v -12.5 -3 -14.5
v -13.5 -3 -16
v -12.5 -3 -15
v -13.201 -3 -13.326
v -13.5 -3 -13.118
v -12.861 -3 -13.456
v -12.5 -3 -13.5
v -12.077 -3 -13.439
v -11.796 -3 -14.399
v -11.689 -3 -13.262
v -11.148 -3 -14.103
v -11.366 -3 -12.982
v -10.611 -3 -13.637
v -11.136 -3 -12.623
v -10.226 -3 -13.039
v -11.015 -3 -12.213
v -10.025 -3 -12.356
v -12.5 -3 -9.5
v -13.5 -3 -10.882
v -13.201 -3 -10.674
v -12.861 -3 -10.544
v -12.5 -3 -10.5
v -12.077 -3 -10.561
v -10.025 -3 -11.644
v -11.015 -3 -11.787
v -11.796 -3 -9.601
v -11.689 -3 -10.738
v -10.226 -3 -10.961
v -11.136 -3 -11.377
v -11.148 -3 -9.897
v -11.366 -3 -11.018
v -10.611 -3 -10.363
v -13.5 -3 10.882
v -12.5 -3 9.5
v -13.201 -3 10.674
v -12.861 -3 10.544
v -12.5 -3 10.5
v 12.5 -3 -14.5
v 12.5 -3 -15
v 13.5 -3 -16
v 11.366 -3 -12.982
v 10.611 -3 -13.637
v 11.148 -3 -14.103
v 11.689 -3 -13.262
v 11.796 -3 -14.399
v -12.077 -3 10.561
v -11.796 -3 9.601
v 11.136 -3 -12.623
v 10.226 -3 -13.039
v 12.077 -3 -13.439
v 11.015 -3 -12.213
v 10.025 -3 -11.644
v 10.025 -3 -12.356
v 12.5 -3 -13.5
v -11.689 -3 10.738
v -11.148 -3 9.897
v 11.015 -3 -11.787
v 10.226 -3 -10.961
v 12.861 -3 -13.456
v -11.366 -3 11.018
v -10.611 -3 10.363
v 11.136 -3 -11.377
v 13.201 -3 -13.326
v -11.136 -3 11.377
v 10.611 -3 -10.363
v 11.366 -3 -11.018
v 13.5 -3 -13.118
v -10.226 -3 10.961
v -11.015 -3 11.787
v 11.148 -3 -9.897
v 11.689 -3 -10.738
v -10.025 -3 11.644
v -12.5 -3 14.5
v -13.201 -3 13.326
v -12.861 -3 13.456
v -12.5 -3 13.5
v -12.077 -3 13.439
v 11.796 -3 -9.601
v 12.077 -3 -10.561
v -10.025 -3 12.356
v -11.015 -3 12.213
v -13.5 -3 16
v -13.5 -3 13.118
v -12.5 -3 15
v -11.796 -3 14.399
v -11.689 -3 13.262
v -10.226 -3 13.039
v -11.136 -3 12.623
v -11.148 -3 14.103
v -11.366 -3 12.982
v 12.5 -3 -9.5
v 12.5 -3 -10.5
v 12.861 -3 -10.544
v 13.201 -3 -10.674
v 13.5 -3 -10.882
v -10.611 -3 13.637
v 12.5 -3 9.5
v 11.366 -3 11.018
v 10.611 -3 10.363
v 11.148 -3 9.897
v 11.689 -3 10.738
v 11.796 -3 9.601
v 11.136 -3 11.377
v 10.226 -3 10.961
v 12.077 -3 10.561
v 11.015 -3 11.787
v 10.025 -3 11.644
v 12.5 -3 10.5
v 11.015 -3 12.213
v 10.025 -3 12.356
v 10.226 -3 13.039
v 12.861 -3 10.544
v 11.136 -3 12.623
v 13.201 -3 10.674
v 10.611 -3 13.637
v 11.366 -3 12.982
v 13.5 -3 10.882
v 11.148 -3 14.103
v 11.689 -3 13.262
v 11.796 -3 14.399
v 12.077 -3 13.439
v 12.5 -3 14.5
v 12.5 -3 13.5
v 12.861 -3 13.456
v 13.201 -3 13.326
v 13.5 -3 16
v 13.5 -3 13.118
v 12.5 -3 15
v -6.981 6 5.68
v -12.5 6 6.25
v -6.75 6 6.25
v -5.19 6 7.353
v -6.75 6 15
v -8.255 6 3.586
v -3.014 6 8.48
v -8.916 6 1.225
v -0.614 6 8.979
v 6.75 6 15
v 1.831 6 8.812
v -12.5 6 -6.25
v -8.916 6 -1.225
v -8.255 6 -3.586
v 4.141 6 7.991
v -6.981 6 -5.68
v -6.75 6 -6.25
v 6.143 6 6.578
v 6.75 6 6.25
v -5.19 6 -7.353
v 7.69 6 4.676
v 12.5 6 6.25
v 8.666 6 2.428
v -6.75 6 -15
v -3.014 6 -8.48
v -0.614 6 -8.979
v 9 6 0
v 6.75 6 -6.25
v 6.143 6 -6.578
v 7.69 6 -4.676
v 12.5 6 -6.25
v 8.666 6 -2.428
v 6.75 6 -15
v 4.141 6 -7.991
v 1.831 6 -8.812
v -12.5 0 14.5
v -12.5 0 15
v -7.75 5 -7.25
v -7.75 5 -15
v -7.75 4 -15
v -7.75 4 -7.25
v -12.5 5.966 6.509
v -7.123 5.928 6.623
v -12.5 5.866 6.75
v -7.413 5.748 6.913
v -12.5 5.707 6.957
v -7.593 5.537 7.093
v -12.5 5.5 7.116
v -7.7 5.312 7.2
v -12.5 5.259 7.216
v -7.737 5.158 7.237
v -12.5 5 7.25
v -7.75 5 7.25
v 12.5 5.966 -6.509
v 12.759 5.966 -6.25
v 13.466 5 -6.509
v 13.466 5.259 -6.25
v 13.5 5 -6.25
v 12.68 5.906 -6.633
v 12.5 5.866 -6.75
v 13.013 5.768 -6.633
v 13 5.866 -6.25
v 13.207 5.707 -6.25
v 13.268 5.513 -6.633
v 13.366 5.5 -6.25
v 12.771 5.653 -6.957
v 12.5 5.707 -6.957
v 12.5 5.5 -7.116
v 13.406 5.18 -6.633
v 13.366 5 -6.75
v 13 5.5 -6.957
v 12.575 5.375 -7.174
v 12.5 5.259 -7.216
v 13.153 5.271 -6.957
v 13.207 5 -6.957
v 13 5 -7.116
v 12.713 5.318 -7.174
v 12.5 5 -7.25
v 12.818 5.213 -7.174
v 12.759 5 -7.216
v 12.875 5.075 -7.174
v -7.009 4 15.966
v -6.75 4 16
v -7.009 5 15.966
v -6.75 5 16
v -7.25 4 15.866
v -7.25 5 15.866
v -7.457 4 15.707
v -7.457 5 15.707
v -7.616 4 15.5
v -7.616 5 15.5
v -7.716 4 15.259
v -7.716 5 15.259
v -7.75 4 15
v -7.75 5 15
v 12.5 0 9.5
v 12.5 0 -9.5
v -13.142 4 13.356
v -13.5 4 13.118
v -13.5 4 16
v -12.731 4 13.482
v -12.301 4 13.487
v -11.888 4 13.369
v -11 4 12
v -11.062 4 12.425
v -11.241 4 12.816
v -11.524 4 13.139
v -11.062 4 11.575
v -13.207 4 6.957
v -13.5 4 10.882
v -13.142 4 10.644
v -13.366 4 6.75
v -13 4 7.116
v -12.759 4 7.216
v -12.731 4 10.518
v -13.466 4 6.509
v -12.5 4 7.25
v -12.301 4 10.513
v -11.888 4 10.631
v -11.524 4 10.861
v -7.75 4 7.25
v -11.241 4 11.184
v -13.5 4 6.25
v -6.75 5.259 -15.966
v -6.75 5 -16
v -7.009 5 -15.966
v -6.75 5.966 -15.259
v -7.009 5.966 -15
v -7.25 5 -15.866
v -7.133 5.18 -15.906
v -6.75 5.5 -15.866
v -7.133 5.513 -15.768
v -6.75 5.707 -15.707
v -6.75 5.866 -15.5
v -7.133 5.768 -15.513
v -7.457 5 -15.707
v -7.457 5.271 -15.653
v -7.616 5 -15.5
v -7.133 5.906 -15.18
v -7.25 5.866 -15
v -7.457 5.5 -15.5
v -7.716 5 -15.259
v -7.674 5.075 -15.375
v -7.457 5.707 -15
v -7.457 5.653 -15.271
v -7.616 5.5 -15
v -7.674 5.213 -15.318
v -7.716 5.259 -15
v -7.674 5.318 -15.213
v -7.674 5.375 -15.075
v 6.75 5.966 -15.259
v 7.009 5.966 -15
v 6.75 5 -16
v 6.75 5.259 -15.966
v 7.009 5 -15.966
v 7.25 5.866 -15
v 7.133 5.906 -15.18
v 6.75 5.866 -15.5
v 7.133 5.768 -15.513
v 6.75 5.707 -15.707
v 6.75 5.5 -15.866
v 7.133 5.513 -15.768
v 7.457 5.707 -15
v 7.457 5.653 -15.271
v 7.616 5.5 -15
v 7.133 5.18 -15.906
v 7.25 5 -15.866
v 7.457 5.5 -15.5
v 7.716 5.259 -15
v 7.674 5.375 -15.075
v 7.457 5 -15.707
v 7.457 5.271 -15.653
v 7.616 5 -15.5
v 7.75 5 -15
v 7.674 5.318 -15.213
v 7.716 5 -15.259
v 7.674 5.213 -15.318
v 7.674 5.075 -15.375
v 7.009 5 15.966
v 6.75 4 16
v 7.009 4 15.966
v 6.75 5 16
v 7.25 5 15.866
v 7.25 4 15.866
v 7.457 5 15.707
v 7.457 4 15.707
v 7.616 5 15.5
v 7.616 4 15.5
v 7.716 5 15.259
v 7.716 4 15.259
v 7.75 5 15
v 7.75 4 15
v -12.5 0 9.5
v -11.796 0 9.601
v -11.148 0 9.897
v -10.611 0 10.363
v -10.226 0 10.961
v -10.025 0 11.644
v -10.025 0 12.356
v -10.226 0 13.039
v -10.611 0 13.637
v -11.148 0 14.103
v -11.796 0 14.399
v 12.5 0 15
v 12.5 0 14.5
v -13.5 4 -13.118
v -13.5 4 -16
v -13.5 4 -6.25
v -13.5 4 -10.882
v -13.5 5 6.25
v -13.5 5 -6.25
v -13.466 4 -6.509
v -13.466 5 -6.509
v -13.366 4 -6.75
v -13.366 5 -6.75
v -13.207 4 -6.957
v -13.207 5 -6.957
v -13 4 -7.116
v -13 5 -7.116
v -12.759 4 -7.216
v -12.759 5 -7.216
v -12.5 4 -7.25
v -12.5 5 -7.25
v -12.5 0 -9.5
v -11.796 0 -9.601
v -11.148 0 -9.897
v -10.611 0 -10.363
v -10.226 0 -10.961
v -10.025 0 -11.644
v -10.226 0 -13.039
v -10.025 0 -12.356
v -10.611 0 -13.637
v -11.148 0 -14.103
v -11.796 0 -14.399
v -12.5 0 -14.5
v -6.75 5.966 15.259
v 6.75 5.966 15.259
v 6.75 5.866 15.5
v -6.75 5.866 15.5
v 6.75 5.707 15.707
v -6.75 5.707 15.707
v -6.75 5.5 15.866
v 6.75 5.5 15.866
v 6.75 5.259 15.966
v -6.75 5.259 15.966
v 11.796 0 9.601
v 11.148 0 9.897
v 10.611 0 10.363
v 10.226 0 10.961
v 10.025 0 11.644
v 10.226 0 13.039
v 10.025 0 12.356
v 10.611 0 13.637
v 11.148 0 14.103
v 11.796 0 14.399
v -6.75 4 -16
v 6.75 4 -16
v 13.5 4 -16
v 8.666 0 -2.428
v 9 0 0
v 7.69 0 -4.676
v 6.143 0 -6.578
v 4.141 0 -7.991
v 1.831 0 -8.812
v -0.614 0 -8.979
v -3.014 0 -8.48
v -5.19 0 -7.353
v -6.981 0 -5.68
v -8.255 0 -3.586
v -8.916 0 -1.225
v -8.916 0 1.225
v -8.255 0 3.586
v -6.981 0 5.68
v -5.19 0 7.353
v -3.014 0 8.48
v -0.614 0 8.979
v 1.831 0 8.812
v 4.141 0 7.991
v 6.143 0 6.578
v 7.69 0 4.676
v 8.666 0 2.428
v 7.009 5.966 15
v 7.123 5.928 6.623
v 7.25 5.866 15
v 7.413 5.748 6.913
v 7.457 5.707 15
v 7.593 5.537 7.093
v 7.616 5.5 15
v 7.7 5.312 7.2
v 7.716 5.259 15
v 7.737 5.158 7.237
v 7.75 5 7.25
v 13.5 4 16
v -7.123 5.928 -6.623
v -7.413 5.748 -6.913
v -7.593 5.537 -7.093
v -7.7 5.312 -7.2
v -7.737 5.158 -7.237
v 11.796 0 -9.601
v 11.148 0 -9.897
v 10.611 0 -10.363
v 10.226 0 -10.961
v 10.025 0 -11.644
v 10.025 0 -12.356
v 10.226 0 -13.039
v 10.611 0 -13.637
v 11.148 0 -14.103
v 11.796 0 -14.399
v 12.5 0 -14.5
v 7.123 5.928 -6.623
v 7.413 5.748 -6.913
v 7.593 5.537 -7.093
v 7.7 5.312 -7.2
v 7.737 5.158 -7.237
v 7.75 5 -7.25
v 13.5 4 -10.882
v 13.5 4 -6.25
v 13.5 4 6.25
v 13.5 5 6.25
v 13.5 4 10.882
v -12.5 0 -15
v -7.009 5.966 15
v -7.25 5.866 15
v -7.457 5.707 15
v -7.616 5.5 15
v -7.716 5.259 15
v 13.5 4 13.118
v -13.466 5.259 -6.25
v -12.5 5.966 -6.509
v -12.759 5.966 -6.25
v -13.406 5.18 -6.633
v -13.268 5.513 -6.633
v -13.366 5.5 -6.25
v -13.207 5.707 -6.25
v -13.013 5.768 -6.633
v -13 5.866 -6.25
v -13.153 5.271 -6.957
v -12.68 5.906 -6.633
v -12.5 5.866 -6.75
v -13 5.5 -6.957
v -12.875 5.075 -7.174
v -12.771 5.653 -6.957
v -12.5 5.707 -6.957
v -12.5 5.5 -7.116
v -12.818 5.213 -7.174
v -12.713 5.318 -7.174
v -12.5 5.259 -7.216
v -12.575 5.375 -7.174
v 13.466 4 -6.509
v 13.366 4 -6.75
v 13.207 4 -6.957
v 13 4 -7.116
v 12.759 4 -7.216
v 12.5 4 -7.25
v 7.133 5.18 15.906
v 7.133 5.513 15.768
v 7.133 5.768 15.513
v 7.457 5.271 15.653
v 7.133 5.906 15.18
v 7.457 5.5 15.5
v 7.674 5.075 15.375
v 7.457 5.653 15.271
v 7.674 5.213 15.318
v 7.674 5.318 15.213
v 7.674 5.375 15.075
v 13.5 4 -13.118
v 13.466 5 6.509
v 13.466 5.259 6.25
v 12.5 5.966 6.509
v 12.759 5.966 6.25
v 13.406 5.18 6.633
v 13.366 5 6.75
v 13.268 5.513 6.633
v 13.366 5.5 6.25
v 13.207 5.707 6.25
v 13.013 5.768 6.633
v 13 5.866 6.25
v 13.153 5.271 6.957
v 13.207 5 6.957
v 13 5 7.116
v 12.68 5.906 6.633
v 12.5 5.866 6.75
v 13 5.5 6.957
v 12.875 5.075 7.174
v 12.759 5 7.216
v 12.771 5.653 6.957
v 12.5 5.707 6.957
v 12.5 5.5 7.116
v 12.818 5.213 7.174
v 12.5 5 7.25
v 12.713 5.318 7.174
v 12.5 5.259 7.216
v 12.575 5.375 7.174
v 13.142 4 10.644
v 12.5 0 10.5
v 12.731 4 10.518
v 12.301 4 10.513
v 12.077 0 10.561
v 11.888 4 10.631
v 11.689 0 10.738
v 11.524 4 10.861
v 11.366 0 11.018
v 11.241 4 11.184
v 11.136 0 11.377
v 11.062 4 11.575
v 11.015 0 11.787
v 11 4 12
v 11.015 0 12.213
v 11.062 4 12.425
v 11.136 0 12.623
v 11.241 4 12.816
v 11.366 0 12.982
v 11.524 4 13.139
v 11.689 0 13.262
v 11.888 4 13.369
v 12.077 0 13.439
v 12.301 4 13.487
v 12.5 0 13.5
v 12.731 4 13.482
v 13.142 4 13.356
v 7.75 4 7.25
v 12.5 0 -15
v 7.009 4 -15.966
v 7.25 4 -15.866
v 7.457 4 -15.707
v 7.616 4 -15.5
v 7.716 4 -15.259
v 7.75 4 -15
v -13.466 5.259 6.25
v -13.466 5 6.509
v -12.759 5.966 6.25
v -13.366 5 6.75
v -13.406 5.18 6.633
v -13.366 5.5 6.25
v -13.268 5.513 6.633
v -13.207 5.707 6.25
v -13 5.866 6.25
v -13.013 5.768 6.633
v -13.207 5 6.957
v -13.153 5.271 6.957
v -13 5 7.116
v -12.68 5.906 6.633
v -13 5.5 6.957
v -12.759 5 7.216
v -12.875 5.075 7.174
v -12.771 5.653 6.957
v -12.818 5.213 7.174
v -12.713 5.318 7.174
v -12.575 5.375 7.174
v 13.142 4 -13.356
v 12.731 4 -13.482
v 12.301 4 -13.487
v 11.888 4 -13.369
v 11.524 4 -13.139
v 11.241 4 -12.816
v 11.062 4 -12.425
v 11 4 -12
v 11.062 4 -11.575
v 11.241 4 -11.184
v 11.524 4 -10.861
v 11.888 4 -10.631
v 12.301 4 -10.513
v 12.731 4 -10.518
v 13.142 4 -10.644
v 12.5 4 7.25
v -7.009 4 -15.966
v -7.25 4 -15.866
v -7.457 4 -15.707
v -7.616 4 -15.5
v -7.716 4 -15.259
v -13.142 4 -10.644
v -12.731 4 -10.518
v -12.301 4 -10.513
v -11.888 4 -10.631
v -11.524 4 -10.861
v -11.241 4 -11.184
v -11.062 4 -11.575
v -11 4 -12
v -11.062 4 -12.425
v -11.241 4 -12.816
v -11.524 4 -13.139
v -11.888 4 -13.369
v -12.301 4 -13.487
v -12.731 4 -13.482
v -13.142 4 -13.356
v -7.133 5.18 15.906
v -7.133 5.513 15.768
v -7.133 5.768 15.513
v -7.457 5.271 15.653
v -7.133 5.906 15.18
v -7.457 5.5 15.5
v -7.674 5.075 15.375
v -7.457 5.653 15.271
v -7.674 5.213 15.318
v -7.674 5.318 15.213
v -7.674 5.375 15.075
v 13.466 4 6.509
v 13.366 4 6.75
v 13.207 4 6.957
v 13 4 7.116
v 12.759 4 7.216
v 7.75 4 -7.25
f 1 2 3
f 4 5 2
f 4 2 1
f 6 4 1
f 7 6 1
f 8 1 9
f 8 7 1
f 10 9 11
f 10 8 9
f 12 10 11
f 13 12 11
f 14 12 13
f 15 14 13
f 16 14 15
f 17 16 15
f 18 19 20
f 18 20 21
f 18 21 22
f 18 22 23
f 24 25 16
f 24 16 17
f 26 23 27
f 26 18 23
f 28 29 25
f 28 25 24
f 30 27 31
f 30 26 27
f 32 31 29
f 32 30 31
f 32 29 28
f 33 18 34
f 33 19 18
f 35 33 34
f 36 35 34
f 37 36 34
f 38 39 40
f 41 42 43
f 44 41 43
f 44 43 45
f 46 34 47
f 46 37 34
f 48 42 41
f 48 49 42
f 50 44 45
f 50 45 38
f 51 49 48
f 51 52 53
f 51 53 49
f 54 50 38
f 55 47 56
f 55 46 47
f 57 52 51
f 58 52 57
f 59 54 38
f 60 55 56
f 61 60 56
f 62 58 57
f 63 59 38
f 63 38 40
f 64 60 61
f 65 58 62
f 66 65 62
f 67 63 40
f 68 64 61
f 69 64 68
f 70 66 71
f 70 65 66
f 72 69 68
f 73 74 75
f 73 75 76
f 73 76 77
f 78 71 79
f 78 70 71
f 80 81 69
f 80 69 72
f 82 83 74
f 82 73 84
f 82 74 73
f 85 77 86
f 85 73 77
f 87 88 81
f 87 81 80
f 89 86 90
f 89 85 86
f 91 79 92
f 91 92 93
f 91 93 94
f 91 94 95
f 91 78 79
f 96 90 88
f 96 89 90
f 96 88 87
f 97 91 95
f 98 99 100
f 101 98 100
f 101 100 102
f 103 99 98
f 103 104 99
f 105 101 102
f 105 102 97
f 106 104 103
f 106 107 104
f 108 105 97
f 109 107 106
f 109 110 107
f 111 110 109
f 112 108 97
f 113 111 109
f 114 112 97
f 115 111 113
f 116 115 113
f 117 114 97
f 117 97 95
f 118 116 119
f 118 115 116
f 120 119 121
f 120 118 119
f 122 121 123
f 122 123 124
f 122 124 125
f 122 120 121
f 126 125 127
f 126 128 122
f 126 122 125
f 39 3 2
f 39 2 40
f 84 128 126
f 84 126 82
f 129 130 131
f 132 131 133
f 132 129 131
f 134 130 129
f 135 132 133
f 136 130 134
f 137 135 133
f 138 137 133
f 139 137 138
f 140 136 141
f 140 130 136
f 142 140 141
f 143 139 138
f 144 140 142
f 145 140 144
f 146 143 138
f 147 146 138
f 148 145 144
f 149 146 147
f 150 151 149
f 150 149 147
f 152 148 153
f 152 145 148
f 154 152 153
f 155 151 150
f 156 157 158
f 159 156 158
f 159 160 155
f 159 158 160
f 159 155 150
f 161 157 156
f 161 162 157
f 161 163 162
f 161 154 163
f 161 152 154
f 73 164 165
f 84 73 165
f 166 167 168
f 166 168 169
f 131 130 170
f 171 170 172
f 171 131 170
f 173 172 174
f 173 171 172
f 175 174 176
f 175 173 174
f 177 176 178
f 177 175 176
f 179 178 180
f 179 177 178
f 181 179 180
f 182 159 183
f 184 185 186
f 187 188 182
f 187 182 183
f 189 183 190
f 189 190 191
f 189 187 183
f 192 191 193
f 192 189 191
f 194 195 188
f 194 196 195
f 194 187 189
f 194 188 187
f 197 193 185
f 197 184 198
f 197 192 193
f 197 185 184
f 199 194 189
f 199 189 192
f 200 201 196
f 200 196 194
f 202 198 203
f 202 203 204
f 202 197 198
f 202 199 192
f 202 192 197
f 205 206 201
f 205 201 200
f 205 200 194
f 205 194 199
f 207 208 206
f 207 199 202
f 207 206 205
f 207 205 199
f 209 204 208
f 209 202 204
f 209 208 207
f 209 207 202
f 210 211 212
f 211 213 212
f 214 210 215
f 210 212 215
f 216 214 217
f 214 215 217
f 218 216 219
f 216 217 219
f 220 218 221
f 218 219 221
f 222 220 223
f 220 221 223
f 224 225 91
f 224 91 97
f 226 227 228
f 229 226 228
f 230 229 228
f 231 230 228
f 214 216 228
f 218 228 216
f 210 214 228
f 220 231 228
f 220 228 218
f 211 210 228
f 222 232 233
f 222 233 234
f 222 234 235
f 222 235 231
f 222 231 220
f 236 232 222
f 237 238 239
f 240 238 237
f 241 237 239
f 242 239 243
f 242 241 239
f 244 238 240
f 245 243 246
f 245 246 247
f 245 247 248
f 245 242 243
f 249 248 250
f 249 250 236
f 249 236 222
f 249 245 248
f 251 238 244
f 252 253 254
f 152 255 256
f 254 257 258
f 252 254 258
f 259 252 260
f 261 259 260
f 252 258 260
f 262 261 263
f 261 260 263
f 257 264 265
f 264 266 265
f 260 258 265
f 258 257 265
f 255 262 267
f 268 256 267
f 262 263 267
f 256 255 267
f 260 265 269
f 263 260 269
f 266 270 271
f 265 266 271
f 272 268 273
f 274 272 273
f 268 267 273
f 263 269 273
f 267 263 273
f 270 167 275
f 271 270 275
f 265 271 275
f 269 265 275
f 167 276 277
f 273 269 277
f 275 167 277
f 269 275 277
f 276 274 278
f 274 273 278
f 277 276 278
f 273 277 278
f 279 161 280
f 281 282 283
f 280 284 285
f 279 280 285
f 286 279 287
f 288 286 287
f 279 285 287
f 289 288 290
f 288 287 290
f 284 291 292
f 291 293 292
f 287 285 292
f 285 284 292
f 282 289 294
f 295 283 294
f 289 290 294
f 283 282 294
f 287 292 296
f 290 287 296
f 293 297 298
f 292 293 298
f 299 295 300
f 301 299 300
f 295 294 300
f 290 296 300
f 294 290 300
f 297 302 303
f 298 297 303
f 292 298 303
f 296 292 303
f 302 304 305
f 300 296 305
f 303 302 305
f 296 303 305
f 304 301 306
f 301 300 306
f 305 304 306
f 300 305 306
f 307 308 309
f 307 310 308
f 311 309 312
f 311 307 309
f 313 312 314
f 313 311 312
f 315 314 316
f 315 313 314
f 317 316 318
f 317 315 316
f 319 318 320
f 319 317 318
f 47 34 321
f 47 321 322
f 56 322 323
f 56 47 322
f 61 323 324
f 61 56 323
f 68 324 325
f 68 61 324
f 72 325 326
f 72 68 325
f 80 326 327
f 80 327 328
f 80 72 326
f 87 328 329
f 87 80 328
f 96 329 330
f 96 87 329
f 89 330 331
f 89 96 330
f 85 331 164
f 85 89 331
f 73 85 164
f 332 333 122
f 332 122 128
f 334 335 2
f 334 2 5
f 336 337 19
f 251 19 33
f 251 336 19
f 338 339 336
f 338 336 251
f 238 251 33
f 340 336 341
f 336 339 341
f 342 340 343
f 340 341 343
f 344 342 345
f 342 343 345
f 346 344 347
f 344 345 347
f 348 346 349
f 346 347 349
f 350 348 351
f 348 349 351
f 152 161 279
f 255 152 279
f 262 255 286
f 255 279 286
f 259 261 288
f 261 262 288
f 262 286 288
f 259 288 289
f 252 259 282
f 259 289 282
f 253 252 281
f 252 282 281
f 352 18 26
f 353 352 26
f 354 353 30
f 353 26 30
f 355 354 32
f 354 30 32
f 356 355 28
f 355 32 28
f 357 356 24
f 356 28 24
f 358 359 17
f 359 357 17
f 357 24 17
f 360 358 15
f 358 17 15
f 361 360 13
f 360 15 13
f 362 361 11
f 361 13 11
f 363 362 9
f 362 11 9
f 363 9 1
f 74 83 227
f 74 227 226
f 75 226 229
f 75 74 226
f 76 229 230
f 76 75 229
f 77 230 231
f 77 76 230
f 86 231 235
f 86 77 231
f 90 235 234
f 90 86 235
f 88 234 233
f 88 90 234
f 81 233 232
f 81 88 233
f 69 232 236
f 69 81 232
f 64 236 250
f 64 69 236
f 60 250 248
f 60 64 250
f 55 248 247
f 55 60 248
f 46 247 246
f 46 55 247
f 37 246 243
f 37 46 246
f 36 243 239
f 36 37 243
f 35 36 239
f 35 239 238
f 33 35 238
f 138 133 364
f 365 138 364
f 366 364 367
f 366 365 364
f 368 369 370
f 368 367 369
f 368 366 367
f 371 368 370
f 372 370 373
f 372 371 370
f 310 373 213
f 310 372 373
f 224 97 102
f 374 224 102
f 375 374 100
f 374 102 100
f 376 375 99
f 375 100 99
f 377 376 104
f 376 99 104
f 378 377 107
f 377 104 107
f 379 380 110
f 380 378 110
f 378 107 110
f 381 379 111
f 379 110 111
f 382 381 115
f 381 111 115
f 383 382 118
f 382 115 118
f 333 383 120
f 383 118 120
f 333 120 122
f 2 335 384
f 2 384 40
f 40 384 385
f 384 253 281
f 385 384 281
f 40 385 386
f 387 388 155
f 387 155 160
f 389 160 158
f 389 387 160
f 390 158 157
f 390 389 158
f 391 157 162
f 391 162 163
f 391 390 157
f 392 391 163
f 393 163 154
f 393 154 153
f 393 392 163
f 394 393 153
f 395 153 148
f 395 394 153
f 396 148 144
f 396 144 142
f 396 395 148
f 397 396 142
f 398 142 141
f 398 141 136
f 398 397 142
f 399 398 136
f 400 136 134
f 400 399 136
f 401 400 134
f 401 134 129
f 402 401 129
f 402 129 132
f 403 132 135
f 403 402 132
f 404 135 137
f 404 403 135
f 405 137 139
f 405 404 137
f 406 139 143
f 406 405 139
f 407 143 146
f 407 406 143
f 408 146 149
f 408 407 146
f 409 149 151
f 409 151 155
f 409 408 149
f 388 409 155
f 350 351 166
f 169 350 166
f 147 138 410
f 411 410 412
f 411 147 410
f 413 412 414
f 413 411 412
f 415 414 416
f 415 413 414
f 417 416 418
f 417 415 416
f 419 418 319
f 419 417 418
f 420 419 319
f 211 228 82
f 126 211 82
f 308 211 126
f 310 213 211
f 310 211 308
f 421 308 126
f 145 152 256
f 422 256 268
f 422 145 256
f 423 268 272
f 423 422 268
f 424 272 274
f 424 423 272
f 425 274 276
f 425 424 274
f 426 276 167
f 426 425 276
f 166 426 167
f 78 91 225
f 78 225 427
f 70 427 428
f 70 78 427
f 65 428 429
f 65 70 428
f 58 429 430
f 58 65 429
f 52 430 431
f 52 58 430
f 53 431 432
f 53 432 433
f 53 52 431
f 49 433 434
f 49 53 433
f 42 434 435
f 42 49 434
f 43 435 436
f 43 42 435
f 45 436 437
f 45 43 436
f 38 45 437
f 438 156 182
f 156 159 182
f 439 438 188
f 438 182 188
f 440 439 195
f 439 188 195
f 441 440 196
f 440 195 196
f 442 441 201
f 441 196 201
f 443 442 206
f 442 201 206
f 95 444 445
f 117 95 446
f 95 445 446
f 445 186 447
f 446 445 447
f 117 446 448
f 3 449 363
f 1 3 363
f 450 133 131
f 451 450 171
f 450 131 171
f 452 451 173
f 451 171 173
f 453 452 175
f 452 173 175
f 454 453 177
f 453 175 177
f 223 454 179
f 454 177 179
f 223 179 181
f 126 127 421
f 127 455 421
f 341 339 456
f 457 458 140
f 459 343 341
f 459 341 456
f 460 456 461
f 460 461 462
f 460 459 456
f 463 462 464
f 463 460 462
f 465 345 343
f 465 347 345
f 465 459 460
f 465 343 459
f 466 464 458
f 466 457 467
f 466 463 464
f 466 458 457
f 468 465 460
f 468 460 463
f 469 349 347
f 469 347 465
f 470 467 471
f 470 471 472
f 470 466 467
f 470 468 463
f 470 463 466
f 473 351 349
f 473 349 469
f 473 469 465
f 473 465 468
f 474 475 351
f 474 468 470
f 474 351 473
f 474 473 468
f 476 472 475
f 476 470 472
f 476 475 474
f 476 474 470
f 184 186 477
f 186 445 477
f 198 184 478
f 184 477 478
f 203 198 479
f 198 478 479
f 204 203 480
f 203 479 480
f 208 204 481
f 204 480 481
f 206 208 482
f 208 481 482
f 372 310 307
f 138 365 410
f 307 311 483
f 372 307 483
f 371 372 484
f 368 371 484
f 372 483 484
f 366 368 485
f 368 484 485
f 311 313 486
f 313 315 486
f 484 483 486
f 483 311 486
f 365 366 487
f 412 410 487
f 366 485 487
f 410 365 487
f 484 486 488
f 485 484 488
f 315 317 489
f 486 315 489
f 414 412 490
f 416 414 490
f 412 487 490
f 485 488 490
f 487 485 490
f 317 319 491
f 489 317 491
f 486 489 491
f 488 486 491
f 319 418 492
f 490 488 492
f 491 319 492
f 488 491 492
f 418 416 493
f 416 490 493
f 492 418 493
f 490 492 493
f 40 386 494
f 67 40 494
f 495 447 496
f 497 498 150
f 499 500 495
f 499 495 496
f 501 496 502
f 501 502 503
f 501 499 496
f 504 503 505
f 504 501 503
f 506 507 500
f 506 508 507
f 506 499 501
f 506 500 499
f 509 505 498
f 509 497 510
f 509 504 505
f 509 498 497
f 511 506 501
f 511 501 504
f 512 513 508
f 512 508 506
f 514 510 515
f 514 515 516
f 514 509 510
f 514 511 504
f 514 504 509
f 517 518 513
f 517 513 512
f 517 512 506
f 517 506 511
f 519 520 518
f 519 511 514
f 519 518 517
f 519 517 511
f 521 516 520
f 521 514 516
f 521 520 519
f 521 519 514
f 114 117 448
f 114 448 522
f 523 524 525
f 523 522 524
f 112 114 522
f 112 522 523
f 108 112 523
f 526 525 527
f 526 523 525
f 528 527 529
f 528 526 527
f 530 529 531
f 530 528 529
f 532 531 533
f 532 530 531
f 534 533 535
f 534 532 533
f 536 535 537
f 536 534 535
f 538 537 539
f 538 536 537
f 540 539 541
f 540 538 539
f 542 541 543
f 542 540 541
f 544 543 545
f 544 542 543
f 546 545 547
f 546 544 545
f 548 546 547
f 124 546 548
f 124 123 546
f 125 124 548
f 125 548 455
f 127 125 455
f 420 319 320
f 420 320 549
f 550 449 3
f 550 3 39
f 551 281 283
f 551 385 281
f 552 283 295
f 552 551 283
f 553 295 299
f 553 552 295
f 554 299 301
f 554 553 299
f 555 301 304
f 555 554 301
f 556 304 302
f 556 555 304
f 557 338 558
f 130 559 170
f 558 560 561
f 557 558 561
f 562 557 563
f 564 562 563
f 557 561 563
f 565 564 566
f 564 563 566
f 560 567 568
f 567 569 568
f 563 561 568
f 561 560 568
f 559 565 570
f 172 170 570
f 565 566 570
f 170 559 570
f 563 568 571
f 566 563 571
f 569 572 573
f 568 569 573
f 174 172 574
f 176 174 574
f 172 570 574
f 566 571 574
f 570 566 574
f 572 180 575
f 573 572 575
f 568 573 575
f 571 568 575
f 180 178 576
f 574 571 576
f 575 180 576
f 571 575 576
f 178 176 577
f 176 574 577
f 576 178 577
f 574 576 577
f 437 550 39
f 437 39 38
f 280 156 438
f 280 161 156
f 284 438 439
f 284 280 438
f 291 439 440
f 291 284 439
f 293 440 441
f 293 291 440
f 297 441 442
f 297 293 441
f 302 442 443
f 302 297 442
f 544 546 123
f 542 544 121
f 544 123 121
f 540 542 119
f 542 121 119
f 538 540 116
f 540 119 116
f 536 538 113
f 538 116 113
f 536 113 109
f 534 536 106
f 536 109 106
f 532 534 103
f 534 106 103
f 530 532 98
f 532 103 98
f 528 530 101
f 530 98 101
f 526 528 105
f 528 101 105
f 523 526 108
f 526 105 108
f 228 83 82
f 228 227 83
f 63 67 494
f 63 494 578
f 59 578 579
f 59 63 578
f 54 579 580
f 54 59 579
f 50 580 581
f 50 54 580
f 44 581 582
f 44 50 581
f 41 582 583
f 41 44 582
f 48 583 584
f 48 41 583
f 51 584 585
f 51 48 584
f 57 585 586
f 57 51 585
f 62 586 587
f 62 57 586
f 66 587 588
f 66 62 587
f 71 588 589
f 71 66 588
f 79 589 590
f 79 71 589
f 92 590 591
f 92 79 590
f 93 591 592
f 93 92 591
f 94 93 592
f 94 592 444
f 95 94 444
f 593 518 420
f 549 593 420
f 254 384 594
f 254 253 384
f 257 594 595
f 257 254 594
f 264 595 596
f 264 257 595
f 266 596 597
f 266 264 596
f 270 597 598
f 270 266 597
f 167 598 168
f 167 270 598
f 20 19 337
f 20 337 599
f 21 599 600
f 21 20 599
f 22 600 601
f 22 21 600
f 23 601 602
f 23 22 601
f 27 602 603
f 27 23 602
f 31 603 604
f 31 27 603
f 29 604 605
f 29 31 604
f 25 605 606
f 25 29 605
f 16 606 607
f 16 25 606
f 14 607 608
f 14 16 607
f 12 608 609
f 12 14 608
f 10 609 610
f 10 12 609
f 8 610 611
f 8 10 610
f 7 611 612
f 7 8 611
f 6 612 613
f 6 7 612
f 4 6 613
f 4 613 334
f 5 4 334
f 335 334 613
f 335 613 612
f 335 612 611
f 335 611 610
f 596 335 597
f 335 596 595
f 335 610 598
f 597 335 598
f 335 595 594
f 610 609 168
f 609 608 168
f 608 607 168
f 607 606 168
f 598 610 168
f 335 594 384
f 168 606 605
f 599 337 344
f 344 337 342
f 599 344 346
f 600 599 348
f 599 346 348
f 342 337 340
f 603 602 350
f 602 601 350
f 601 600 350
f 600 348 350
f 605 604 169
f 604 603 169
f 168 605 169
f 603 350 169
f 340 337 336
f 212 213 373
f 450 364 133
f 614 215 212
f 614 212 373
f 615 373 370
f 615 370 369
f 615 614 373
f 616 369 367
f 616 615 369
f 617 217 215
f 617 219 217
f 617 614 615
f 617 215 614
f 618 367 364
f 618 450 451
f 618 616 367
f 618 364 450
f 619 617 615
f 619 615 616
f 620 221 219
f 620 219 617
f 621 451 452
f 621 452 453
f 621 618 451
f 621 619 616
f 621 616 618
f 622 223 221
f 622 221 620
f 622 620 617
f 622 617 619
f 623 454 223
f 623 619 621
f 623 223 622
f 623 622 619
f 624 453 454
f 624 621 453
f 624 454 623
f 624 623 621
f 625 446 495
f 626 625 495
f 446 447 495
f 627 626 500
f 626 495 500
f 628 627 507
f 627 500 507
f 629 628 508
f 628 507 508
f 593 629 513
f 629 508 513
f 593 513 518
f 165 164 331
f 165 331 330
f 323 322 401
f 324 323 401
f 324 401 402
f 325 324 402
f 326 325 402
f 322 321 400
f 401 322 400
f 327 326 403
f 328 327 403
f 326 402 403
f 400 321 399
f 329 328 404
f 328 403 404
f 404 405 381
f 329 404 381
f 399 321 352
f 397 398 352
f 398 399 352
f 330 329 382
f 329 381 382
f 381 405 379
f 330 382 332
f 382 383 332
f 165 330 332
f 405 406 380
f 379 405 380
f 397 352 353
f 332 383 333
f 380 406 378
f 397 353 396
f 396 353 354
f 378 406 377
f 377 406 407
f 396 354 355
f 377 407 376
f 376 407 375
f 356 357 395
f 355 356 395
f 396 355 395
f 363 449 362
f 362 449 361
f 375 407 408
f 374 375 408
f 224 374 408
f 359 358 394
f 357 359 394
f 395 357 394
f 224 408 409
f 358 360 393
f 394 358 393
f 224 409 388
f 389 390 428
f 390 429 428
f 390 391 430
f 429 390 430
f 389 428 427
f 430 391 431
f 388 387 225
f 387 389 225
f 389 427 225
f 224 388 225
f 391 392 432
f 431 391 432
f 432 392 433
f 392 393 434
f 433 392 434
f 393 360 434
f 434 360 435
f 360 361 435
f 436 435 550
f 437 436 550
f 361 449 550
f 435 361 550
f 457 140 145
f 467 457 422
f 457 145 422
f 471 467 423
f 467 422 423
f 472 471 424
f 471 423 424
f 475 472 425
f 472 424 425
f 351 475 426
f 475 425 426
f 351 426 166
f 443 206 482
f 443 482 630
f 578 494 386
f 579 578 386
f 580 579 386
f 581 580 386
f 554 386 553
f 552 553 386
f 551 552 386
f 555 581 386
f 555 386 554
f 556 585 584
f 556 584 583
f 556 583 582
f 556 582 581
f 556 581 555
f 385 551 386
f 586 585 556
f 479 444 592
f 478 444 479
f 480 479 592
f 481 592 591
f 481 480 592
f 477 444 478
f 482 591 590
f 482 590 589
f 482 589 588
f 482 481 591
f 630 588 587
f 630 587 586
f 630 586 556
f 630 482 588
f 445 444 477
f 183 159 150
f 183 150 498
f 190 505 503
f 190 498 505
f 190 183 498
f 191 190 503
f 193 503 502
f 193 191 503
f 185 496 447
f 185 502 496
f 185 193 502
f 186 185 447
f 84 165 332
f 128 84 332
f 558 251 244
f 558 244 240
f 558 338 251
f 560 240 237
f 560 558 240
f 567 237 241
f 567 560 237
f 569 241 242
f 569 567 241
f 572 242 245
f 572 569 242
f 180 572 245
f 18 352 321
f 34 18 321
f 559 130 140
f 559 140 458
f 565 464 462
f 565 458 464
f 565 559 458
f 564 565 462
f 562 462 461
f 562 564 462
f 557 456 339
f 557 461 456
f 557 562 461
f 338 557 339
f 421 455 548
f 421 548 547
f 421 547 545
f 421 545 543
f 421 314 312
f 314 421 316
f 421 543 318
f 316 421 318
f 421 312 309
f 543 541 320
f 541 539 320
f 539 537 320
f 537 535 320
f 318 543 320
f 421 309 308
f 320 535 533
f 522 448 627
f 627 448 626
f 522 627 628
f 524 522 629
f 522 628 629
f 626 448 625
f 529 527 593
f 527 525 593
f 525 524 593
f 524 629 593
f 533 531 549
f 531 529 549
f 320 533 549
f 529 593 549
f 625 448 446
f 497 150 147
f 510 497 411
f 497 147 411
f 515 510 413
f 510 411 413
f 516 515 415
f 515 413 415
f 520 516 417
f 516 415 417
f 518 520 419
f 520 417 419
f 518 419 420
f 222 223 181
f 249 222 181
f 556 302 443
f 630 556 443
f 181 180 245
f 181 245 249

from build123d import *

# Parameters (mm, degrees)
SKETCH2_W               = 27
SKETCH2_H               = 32
SKETCH2_R               = 9
BOSS_EXTRUDE1_DEPTH     = 6
SKETCH3_W               = 27
SKETCH3_H               = 32
SKETCH3_W_2             = 25
SKETCH3_H_2             = 30
BOSS_EXTRUDE2_DEPTH     = 3
SKETCH1_R               = 1.5
CUT_EXTRUDE1_DEPTH      = 7
CUT_EXTRUDE1_DEPTH_BACK = 4
BOSS_EXTRUDE4_DEPTH     = 9
MIRROR2_COPY_1_DEPTH    = 9
SKETCH6_R               = 2.8
CUT_EXTRUDE2_DEPTH      = 2
MIRROR4_COPY_1_SKETCH_R = 2.8
MIRROR4_COPY_1_DEPTH    = 2
FILLET1_R               = 1
SKETCH11_W              = 9.5
SKETCH11_H              = 9.5
CUT_EXTRUDE3_DEPTH      = 2
MIRROR6_COPY_1_SKETCH_W = 9.5
MIRROR6_COPY_1_SKETCH_H = 9.5
MIRROR6_COPY_1_DEPTH    = 2
FILLET2_R               = 1


with BuildPart() as part:
    # Sketch2 → Boss-Extrude1 (new body)
    with BuildSketch(Plane(origin=(0, 0, 0), x_dir=(1, 0, 0), z_dir=(0, 1, 0))):
        Rectangle(SKETCH2_W, SKETCH2_H)
        Circle(SKETCH2_R, mode=Mode.SUBTRACT)
    extrude(amount=BOSS_EXTRUDE1_DEPTH)

    # Sketch3 → Boss-Extrude2 (add)
    with BuildSketch(Plane.XZ):
        Rectangle(SKETCH3_W, SKETCH3_H)
        Rectangle(SKETCH3_W_2, SKETCH3_H_2, mode=Mode.SUBTRACT)
    extrude(amount=BOSS_EXTRUDE2_DEPTH)

    # Sketch1 → Cut-Extrude1 (cut, two sides)
    with BuildSketch(Plane(origin=(0, 0, 0), x_dir=(1, 0, 0), z_dir=(0, 1, 0))) as cut_extrude1_sk:
        with Locations((-12.5, 12)):
            Circle(SKETCH1_R)
        with Locations((12.5, 12)):
            Circle(SKETCH1_R)
        with Locations((-12.5, -12)):
            Circle(SKETCH1_R)
        with Locations((12.5, -12)):
            Circle(SKETCH1_R)
    extrude(amount=CUT_EXTRUDE1_DEPTH, mode=Mode.SUBTRACT)
    extrude(cut_extrude1_sk.sketch, amount=-CUT_EXTRUDE1_DEPTH_BACK, mode=Mode.SUBTRACT)

    # Sketch5 → Boss-Extrude4 (add)
    with BuildSketch(Plane.XZ.offset(3)):
        with BuildLine():
            Line((13.5, -10.881966011), (13.5, -9.708712153))
            ThreePointArc((13.5, -9.708712153), (10, -12), (13.5, -14.291287847))
            Line((13.5, -14.291287847), (13.5, -13.118033989))
            ThreePointArc((13.5, -13.118033989), (11, -12), (13.5, -10.881966011))
        make_face()
    boss_extrude4 = extrude(amount=-BOSS_EXTRUDE4_DEPTH)

    # Mirror1: Boss-Extrude4 across plane
    add(boss_extrude4.mirror(Plane(origin=(0, 0, 0), x_dir=(0, 0, 1), z_dir=(1, 0, 0))))

    # Mirror2: Boss-Extrude4 across plane
    add(boss_extrude4.mirror(Plane.XY))

    # Mirror2 copy 1 sketch → Mirror2 copy 1 (add)
    with BuildSketch(Plane(origin=(0, -3, 0), x_dir=(-1, 0, 0), z_dir=(0, -1, 0))):
        with BuildLine():
            Line((13.5, -10.881966011), (13.5, -9.708712153))
            ThreePointArc((13.5, -9.708712153), (10, -12), (13.5, -14.291287847))
            Line((13.5, -14.291287847), (13.5, -13.118033989))
            ThreePointArc((13.5, -13.118033989), (11, -12), (13.5, -10.881966011))
        make_face()
    extrude(amount=-MIRROR2_COPY_1_DEPTH)

    # Sketch6 → Cut-Extrude2 (cut)
    with BuildSketch(Plane(origin=(0, 6, 0), x_dir=(1, 0, 0), z_dir=(0, 1, 0))):
        with Locations((12.5, 12)):
            Circle(SKETCH6_R)
    cut_extrude2 = extrude(amount=-CUT_EXTRUDE2_DEPTH, mode=Mode.SUBTRACT)

    # Mirror3: Cut-Extrude2 across plane
    add(cut_extrude2.mirror(Plane(origin=(0, 0, 0), x_dir=(0, 0, 1), z_dir=(1, 0, 0))), mode=Mode.SUBTRACT)

    # Mirror4: Cut-Extrude2 across plane
    add(cut_extrude2.mirror(Plane.XY), mode=Mode.SUBTRACT)

    # Mirror4 copy 1 sketch → Mirror4 copy 1 (cut)
    with BuildSketch(Plane(origin=(0, 6, 0), x_dir=(-1, 0, 0), z_dir=(0, 1, 0))):
        with Locations((12.5, 12)):
            Circle(MIRROR4_COPY_1_SKETCH_R)
    extrude(amount=-MIRROR4_COPY_1_DEPTH, mode=Mode.SUBTRACT)

    # Fillet1
    fillet1_edges = [part.edges().sort_by_distance(p)[0] for p in [
        (-13.5, 6, -15.307669683),
        (13.5, 6, -15.307669683),
        (0, 6, 16),
        (-13.5, 6, 0),
        (13.5, 6, 0),
        (-13.5, 6, 15.307669683),
        (13.5, 6, 15.307669683),
        (0, 6, -16),
    ]]
    fillet(fillet1_edges, radius=FILLET1_R)

    # Sketch11 → Cut-Extrude3 (cut)
    with BuildSketch(Plane(origin=(0, 6, 0), x_dir=(1, 0, 0), z_dir=(0, 1, 0))):
        with Locations((-12.5, -12)):
            Rectangle(SKETCH11_W, SKETCH11_H)
    cut_extrude3 = extrude(amount=-CUT_EXTRUDE3_DEPTH, mode=Mode.SUBTRACT)

    # Mirror5: Cut-Extrude3 across plane
    add(cut_extrude3.mirror(Plane(origin=(0, 0, 0), x_dir=(0, 0, 1), z_dir=(1, 0, 0))), mode=Mode.SUBTRACT)

    # Mirror6: Cut-Extrude3 across plane
    add(cut_extrude3.mirror(Plane.XY), mode=Mode.SUBTRACT)

    # Mirror6 copy 1 sketch → Mirror6 copy 1 (cut)
    with BuildSketch(Plane(origin=(0, 6, 0), x_dir=(-1, 0, 0), z_dir=(0, 1, 0))):
        with Locations((-12.5, -12)):
            Rectangle(MIRROR6_COPY_1_SKETCH_W, MIRROR6_COPY_1_SKETCH_H)
    extrude(amount=-MIRROR6_COPY_1_DEPTH, mode=Mode.SUBTRACT)

    # Fillet2
    fillet2_edges = [part.edges().sort_by_distance(p)[0] for p in [
        (-7.75, 4.5, 16),
        (-13.5, 4.5, 7.25),
        (-7.75, 6, 11.125),
        (-10.125, 6, 7.25),
        (7.75, 6, 11.125),
        (10.125, 6, 7.25),
        (7.75, 4.5, 16),
        (13.5, 4.5, 7.25),
        (13.5, 4.5, -7.25),
        (7.75, 4.5, -16),
        (7.75, 6, -11.125),
        (10.125, 6, -7.25),
        (-7.75, 6, -11.125),
        (-10.125, 6, -7.25),
        (-7.75, 4.5, -16),
        (-13.5, 4.5, -7.25),
    ]]
    fillet(fillet2_edges, radius=FILLET2_R)


solid = part.part
